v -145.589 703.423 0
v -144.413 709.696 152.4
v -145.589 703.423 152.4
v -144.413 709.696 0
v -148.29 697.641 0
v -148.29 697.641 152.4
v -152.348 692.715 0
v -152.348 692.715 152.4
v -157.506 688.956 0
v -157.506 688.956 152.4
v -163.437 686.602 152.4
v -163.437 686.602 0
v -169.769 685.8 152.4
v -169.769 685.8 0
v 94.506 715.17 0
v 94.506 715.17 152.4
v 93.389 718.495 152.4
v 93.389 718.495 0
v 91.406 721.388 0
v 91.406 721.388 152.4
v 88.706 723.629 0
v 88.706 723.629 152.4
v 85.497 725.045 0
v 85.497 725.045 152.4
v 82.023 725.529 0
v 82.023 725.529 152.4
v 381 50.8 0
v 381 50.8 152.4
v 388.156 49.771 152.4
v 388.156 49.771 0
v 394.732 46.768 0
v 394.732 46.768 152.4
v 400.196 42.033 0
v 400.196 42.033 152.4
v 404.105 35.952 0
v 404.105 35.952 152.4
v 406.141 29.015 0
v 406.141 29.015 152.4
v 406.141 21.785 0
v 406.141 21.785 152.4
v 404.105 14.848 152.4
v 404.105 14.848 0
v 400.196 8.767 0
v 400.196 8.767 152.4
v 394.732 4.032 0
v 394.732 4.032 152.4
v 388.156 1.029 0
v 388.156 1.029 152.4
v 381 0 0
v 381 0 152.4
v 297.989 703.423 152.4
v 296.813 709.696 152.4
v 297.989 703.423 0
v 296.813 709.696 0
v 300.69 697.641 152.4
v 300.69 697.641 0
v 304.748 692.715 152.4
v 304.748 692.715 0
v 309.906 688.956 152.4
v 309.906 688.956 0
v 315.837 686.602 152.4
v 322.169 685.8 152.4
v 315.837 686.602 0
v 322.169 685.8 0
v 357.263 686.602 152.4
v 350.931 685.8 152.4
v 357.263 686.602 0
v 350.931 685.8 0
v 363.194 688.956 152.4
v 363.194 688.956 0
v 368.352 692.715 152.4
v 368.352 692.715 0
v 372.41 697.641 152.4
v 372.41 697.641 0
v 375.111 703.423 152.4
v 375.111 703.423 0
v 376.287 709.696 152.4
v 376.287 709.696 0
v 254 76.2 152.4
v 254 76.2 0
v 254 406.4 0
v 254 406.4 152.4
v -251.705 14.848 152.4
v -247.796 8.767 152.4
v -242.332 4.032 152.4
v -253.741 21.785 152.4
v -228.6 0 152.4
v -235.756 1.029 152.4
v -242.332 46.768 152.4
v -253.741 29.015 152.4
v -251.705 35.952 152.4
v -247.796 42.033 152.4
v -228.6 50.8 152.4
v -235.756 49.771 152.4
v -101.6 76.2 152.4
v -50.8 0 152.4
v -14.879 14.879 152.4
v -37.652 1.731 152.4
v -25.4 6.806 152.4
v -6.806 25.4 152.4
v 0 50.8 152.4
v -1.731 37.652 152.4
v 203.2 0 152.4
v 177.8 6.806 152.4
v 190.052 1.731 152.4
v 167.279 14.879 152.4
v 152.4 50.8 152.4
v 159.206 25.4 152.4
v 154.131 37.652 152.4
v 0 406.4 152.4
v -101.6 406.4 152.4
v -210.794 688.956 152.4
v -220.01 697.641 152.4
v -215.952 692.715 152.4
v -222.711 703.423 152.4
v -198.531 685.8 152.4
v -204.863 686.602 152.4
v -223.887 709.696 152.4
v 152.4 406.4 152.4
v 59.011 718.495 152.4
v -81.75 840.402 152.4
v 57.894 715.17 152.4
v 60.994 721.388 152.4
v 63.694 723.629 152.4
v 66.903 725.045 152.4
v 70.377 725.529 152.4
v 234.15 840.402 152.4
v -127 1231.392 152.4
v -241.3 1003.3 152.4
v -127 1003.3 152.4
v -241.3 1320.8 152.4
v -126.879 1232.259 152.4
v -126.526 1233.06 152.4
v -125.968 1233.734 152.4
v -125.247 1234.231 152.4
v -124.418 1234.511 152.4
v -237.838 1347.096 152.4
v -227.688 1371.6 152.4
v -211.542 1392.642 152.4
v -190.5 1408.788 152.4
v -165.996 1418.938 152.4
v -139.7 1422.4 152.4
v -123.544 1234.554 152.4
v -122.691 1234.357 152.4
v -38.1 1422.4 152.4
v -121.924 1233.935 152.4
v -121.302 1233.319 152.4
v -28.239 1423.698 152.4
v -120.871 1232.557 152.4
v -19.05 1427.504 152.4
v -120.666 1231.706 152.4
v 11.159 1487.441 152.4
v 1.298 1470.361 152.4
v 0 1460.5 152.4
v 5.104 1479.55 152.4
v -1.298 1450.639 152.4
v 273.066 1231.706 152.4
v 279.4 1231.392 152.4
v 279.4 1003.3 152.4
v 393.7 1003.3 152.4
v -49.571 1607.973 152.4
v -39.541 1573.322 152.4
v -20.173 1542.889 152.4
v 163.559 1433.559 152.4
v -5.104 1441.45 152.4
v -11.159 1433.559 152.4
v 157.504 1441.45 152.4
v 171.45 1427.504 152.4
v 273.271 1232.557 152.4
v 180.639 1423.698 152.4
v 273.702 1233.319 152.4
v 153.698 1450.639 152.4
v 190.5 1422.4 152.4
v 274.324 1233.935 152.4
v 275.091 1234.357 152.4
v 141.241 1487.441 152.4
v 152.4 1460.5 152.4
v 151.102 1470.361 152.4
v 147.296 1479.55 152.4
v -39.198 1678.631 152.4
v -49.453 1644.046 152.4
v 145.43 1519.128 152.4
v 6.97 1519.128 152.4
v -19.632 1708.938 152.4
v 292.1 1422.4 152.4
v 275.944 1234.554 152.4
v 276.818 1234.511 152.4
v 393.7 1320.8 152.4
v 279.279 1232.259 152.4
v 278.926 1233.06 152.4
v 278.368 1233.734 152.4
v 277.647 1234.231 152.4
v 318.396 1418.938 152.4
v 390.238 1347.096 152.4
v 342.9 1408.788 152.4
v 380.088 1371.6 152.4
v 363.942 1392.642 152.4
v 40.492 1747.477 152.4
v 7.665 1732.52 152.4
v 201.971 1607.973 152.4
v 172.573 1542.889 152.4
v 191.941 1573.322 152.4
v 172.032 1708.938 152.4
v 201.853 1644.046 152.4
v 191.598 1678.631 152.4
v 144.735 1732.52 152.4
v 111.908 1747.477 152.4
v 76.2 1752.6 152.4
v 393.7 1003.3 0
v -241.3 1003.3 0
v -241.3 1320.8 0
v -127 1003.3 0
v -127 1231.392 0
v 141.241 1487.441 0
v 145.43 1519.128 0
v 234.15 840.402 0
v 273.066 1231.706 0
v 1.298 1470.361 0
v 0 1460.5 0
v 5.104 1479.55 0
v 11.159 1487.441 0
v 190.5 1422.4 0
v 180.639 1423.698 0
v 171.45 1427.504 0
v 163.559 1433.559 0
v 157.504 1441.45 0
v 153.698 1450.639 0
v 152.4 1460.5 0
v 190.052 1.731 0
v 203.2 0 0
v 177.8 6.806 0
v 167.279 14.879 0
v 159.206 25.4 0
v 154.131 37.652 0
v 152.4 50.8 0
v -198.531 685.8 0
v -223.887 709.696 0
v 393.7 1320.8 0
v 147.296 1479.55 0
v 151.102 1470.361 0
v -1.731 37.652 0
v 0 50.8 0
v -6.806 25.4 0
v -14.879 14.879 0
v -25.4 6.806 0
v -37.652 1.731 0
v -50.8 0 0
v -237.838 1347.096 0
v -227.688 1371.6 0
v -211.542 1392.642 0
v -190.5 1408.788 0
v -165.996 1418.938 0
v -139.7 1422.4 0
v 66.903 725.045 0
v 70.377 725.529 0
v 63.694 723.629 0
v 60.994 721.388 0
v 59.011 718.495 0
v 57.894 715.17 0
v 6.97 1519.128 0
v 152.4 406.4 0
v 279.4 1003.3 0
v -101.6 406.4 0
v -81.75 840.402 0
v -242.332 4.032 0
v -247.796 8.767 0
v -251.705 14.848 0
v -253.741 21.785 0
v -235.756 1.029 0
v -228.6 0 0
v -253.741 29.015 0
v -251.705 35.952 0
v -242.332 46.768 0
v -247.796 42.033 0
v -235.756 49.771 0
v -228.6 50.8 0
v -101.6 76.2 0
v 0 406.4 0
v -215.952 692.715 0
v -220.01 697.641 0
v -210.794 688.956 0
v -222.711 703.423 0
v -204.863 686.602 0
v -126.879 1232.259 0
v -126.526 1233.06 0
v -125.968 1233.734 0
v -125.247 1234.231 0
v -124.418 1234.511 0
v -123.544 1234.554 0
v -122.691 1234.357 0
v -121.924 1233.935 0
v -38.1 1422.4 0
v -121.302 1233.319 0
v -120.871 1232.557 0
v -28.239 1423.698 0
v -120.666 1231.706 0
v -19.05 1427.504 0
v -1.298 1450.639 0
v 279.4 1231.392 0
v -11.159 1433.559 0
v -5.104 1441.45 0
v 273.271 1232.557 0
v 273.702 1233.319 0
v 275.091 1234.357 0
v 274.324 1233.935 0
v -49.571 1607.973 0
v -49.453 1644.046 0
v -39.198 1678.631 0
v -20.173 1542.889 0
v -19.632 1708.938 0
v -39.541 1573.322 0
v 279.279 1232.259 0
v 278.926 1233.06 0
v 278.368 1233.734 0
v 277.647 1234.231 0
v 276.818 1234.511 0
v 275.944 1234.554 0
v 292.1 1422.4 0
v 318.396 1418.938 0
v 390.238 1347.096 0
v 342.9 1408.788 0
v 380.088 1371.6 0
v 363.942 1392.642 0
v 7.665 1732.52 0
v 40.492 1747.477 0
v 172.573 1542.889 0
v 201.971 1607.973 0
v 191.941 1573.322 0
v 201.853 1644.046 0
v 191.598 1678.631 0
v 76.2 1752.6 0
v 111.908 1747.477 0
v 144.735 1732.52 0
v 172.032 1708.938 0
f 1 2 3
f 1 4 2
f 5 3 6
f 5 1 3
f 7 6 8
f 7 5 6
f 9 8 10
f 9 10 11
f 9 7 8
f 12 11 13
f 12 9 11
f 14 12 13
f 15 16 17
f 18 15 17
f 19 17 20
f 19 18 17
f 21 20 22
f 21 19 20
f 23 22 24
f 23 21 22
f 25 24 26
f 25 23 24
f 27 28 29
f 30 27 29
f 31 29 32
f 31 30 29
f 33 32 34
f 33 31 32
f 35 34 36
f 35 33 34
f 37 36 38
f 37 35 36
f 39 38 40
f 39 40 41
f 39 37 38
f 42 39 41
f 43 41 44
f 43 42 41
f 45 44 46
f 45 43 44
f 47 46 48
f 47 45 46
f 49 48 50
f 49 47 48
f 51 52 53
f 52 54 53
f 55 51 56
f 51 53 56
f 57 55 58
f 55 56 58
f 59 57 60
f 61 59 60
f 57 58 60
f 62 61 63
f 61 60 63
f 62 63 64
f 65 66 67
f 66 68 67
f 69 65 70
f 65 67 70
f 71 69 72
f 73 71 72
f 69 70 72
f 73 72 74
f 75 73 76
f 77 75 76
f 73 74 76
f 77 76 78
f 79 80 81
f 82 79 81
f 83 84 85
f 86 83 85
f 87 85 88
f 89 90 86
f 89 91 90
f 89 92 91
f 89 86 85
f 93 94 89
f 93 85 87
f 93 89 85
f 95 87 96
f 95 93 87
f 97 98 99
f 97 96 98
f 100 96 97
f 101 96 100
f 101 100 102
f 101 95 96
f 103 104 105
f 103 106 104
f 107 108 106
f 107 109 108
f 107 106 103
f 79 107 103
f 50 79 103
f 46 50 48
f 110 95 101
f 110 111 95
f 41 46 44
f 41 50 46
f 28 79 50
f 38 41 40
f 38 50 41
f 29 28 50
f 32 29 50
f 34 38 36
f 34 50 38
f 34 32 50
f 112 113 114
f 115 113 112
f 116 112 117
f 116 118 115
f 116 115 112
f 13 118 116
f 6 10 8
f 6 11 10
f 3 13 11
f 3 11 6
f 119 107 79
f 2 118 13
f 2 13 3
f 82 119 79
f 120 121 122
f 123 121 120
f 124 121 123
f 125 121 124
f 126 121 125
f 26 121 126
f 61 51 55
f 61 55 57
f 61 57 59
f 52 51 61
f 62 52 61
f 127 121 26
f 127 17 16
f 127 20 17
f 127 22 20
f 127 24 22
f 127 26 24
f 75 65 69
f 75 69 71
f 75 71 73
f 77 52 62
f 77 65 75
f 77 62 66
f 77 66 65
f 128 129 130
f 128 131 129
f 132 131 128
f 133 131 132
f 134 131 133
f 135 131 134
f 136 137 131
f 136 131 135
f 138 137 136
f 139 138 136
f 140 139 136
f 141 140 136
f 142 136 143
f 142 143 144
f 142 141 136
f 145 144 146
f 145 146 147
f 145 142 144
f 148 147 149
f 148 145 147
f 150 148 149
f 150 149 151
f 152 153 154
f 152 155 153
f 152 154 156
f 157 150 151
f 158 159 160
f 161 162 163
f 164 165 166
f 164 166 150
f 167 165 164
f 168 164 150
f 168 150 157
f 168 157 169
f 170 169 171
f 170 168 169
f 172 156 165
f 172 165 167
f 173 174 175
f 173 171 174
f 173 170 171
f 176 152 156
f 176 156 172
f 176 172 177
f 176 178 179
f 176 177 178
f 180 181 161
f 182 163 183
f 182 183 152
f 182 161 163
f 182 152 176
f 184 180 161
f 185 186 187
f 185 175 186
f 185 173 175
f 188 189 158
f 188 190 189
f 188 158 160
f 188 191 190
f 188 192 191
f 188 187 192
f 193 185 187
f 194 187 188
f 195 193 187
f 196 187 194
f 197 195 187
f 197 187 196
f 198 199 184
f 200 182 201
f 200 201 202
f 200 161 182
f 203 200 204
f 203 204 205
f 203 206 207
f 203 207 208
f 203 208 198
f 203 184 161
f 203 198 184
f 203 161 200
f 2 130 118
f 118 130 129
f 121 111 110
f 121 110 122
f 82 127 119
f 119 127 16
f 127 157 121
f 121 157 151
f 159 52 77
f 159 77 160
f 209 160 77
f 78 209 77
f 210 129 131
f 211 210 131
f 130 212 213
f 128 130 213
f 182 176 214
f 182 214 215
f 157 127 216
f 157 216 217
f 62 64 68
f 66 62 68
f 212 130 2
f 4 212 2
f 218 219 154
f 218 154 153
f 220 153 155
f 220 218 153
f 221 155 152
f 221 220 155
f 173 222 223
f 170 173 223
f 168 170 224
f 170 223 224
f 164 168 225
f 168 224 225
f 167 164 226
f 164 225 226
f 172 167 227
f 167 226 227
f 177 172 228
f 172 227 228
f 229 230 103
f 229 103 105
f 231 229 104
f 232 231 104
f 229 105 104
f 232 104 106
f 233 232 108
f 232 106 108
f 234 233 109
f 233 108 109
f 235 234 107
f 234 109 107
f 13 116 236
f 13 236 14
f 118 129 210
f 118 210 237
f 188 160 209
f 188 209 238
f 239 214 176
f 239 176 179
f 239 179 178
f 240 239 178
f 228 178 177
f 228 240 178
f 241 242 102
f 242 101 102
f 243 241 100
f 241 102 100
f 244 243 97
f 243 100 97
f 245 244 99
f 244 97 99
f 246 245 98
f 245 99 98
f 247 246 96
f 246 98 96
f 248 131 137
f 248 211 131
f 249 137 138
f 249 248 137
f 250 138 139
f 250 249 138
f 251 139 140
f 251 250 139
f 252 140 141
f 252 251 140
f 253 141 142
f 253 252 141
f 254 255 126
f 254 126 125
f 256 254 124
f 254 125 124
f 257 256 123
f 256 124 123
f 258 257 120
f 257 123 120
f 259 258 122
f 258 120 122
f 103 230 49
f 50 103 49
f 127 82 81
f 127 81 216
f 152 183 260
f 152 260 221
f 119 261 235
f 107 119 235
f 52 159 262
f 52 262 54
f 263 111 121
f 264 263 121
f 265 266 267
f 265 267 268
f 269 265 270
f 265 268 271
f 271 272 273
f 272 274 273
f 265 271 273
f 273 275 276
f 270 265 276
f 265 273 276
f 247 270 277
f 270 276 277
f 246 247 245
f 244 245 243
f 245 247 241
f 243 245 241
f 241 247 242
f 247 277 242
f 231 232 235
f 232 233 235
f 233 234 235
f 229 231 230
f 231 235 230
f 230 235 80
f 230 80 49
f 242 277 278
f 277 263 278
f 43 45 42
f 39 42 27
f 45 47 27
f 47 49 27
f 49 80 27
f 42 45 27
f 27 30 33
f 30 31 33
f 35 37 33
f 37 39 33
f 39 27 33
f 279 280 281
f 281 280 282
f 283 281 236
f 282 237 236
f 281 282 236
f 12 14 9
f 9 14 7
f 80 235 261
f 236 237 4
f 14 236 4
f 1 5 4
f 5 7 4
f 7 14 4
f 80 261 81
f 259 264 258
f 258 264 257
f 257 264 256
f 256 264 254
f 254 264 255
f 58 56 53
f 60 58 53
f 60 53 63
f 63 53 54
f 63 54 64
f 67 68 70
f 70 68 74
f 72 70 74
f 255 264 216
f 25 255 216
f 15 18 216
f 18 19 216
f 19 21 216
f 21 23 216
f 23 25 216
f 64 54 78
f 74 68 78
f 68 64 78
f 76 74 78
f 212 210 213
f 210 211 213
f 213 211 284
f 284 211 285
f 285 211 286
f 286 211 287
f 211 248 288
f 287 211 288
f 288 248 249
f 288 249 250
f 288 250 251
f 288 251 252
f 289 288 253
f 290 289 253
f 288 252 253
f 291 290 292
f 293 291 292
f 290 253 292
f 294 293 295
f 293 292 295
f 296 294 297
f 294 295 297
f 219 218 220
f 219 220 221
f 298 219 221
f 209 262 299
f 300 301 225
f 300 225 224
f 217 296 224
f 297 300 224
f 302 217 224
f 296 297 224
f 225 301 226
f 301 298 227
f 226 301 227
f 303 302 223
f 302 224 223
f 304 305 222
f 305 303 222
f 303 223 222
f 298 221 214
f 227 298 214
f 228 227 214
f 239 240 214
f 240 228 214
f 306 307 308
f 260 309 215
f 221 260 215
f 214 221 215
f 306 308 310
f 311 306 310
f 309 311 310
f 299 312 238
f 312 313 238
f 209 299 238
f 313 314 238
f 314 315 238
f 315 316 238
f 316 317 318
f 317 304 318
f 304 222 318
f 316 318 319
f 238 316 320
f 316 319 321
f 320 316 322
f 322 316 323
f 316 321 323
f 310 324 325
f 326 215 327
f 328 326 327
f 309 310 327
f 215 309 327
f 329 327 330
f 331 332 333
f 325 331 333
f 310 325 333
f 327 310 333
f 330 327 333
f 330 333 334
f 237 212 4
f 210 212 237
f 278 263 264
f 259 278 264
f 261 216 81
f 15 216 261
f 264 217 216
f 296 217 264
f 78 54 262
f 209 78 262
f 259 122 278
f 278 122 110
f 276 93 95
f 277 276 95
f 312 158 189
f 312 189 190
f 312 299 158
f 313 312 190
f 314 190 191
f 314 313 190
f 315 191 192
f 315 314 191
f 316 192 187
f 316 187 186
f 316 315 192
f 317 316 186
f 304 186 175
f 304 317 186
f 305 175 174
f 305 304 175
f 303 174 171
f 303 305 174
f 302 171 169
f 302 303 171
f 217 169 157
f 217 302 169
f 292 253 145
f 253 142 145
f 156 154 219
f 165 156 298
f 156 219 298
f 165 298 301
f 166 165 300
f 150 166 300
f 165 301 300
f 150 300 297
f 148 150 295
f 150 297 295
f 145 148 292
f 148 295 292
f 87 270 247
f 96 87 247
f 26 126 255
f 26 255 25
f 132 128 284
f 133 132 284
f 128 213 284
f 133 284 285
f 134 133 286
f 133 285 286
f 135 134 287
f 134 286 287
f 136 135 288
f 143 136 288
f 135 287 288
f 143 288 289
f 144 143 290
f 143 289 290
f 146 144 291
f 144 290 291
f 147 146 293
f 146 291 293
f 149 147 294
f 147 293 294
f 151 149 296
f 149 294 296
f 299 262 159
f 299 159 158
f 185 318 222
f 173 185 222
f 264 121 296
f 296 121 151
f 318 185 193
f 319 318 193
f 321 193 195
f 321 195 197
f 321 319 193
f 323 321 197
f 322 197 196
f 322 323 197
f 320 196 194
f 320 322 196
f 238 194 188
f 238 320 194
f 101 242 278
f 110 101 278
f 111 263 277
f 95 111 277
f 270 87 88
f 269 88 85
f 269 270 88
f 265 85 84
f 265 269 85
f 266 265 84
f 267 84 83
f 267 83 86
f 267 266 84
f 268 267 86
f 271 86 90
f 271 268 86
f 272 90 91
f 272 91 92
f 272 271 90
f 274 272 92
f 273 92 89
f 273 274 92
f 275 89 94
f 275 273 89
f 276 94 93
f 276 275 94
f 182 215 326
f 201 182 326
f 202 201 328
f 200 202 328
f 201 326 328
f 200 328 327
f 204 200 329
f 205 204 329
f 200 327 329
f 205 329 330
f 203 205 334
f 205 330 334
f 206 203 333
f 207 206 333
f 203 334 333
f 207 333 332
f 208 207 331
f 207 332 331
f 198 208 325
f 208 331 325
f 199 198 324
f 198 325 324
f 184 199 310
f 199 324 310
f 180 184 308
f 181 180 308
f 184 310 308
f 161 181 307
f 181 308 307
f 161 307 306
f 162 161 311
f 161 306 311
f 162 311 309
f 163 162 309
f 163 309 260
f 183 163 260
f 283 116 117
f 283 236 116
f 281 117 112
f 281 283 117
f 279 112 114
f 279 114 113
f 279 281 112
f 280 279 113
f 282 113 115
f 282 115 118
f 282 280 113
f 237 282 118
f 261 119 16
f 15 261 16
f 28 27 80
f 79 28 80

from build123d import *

# Parameters (mm, degrees)
SKETCH1_R            = 127
SKETCH1_W            = 76.2
SKETCH1_H            = 660.4
SKETCH1_W_2          = 101.6
SKETCH1_H_2          = 762
SKETCH1_W_3          = 228.6
SKETCH1_H_3          = 50.8
SKETCH1_W_4          = 152.4
SKETCH1_H_4          = 76.2
BOSS_EXTRUDE1_DEPTH  = 152.4
SKETCH2_W            = 406.4
SKETCH2_H            = 50.8
BOSS_EXTRUDE2_DEPTH  = 152.4
BOSS_EXTRUDE3_DEPTH  = 152.4
BOSS_EXTRUDE4_DEPTH  = 152.4
BOSS_EXTRUDE5_DEPTH  = 152.4
CUT_EXTRUDE1_DEPTH   = 152.4
SKETCH7_W            = 279.4
SKETCH7_H            = 114.872803244
BOSS_EXTRUDE6_DEPTH  = 152.4
BOSS_EXTRUDE7_DEPTH  = 152.4
SKETCH9_W            = 38.1
SKETCH9_H            = 736.6
BOSS_EXTRUDE8_DEPTH  = 152.4
FILLET2_R            = 101.6
CUT_EXTRUDE2_DEPTH   = 152.4
FILLET3_R            = 50.8
FILLET5_START        = -1
FILLET5_DEPTH        = 154
FILLET5_2_DEPTH      = 152.4
FILLET6_R            = 12.7
FILLET7_R            = 25.4
FILLET8_R            = 3.175
BOSS_EXTRUDE9_DEPTH  = 152.4
BOSS_EXTRUDE10_DEPTH = 152.4


with BuildPart() as part:
    # Sketch1 → Boss-Extrude1 (new body)
    with BuildSketch(Plane.XY):
        with Locations(Location((76.2, 1625.6, 0), (0, 0, 180))):
            Circle(SKETCH1_R)
        Polygon((-101.6, 812.8), (0, 812.8), (152.4, 812.8), (254, 812.8), (254, 1346.2), (254, 1422.4), (152.4, 1422.4), (0, 1422.4), (-101.6, 1422.4), (-101.6, 1346.2), align=None)
        Polygon((-127, 1346.2), (-101.6, 1346.2), (-101.6, 1422.4), (-203.2, 1422.4), (-203.2, 1346.2), align=None)
        with Locations((-165.1, 1016)):
            Rectangle(SKETCH1_W, SKETCH1_H)
        Polygon((254, 1422.4), (254, 1346.2), (279.4, 1346.2), (355.6, 1346.2), (355.6, 1422.4), align=None)
        with Locations((317.5, 1016)):
            Rectangle(SKETCH1_W, SKETCH1_H)
        with Locations((203.2, 431.8)):
            Rectangle(SKETCH1_W_2, SKETCH1_H_2)
        with Locations((-50.8, 431.8)):
            Rectangle(SKETCH1_W_2, SKETCH1_H_2)
        with Locations((-114.3, 25.4)):
            Rectangle(SKETCH1_W_3, SKETCH1_H_3)
        Polygon((254, 50.8), (152.4, 50.8), (152.4, 0), (381, 0), (381, 50.8), align=None)
        with BuildLine():
            ThreePointArc((381, 50.8), (406.4, 25.4), (381, 0))
            Line((381, 0), (381, 50.8))
        make_face()
        with BuildLine():
            ThreePointArc((-228.6, 0), (-254, 25.4), (-228.6, 50.8))
            Line((-228.6, 50.8), (-228.6, 0))
        make_face()
        with Locations((76.2, 1460.5)):
            Rectangle(SKETCH1_W_4, SKETCH1_H_4)
    extrude(amount=BOSS_EXTRUDE1_DEPTH)

    # Sketch2 → Boss-Extrude2 (add)
    with BuildSketch(Plane.XY.offset(152.4)):
        with Locations((76.2, 1320.8)):
            Rectangle(SKETCH2_W, SKETCH2_H)
    extrude(amount=-BOSS_EXTRUDE2_DEPTH)

    # Sketch3 → Boss-Extrude3 (add)
    with BuildSketch(Plane.XY.offset(152.4)):
        Polygon((76.2, 812.8), (0, 406.4), (0, 812.8), align=None)
    extrude(amount=-BOSS_EXTRUDE3_DEPTH)

    # Sketch4 → Boss-Extrude4 (add)
    with BuildSketch(Plane.XY.offset(152.4)):
        Polygon((76.2, 812.8), (152.4, 812.8), (152.4, 406.4), align=None)
    extrude(amount=-BOSS_EXTRUDE4_DEPTH)

    # Sketch5 → Boss-Extrude5 (add)
    with BuildSketch(Plane.XY.offset(152.4)):
        Polygon((-228.6, 50.8), (-101.6, 76.2), (-101.6, 50.8), align=None)
        Polygon((254, 76.2), (254, 50.8), (381, 50.8), align=None)
    extrude(amount=-BOSS_EXTRUDE5_DEPTH)

    # Sketch6 → Cut-Extrude1 (cut)
    with BuildSketch(Plane.XY.offset(152.4)):
        Polygon((-101.6, 406.4), (-81.750104461, 840.402248986), (-101.6, 1295.4), align=None)
        Polygon((254, 406.4), (234.150104461, 840.402248986), (254, 1295.4), align=None)
    extrude(amount=-CUT_EXTRUDE1_DEPTH, mode=Mode.SUBTRACT)

    # Sketch7 → Boss-Extrude6 (add)
    with BuildSketch(Plane.XY.offset(152.4)):
        with Locations((57.949895539, 782.965847364)):
            Rectangle(SKETCH7_W, SKETCH7_H)
    extrude(amount=-BOSS_EXTRUDE6_DEPTH)

    # Sketch8 → Boss-Extrude7 (add)
    with BuildSketch(Plane.XY.offset(152.4)):
        Polygon((-81.750104461, 840.402248986), (-127, 1295.4), (-61.647363893, 1295.4), align=None)
        Polygon((214.047363893, 1295.4), (234.150104461, 840.402248986), (279.4, 1295.4), align=None)
    extrude(amount=-BOSS_EXTRUDE7_DEPTH)

    # Sketch9 → Boss-Extrude8 (add)
    with BuildSketch(Plane.XY.offset(152.4)):
        with Locations((-222.25, 1054.1)):
            Rectangle(SKETCH9_W, SKETCH9_H)
        with Locations((374.65, 1054.1)):
            Rectangle(SKETCH9_W, SKETCH9_H)
    extrude(amount=-BOSS_EXTRUDE8_DEPTH)

    # Fillet2
    fillet2_edges = [part.edges().sort_by_distance(p)[0] for p in [
        (-241.3, 1422.4, 76.2),
        (393.7, 1422.4, 76.2),
    ]]
    fillet(fillet2_edges, radius=FILLET2_R)

    # Sketch10 → Cut-Extrude2 (cut)
    with BuildSketch(Plane.XY.offset(152.4)):
        Polygon((-241.3, 1003.3), (-222.469288436, 685.8), (-241.3, 685.8), align=None)
        Polygon((-145.830711564, 685.8), (-127, 685.8), (-127, 1003.3), align=None)
        Polygon((279.4, 1003.3), (298.230711564, 685.8), (279.4, 685.8), align=None)
        Polygon((374.869288436, 685.8), (393.7, 685.8), (393.7, 1003.3), align=None)
    extrude(amount=-CUT_EXTRUDE2_DEPTH, mode=Mode.SUBTRACT)

    # Fillet3
    fillet3_edges = [part.edges().sort_by_distance(p)[0] for p in [
        (152.4, 0, 76.2),
        (0, 0, 76.2),
    ]]
    fillet(fillet3_edges, radius=FILLET3_R)

    # Fillet5: read off the stored shape, not the designer's step
    # Fillet5 outline → Fillet5 (cut)
    with BuildSketch(Plane.XY.offset(FILLET5_START)):
        with BuildLine():
            ThreePointArc((0, 1460.5), (11.159231637, 1487.440768363), (38.1, 1498.6))
            Line((38.1, 1498.6), (0, 1498.6))
            Line((0, 1498.6), (0, 1460.5))
        make_face()
        with BuildLine():
            ThreePointArc((114.3, 1498.6), (141.240768363, 1487.440768363), (152.4, 1460.5))
            Line((152.4, 1460.5), (152.4, 1498.6))
            Line((152.4, 1498.6), (114.3, 1498.6))
        make_face()
    extrude(amount=FILLET5_DEPTH, mode=Mode.SUBTRACT)

    # Fillet5 2 outline → Fillet5 2 (add)
    with BuildSketch(Plane.XY):
        with BuildLine():
            Line((152.4, 1422.4), (190.5, 1422.4))
            ThreePointArc((190.5, 1422.4), (163.559231637, 1433.559231637), (152.4, 1460.5))
            Line((152.4, 1460.5), (152.4, 1422.4))
        make_face()
        with BuildLine():
            Line((0, 1422.4), (0, 1460.5))
            ThreePointArc((0, 1460.5), (-11.159231637, 1433.559231637), (-38.1, 1422.4))
            Line((-38.1, 1422.4), (0, 1422.4))
        make_face()
    extrude(amount=FILLET5_2_DEPTH)

    # Fillet6
    fillet6_edges = [part.edges().sort_by_distance(p)[0] for p in [
        (92.563228923, 725.529445742, 76.2),
        (59.836771077, 725.529445742, 76.2),
    ]]
    fillet(fillet6_edges, radius=FILLET6_R)

    # Fillet7
    fillet7_edges = [part.edges().sort_by_distance(p)[0] for p in [
        (-222.469288436, 685.8, 76.2),
        (-145.830711564, 685.8, 76.2),
        (298.230711564, 685.8, 76.2),
        (374.869288436, 685.8, 76.2),
    ]]
    fillet(fillet7_edges, radius=FILLET7_R)

    # Fillet8
    fillet8_edges = [part.edges().sort_by_distance(p)[0] for p in [
        (279.4, 1295.4, 76.2),
        (-127, 1295.4, 76.2),
    ]]
    fillet(fillet8_edges, radius=FILLET8_R)

    # Sketch11 → Boss-Extrude9 (add)
    with BuildSketch(Plane.XY.offset(152.4)):
        Polygon((6.96991061, 1519.128432325), (11.159231637, 1487.440768363), (76.2, 1498.6), align=None)
    extrude(amount=-BOSS_EXTRUDE9_DEPTH)

    # Sketch12 → Boss-Extrude10 (add)
    with BuildSketch(Plane.XY.offset(152.4)):
        Polygon((145.43008939, 1519.128432325), (76.2, 1498.6), (141.240768363, 1487.440768363), align=None)
    extrude(amount=-BOSS_EXTRUDE10_DEPTH)


solid = part.part
